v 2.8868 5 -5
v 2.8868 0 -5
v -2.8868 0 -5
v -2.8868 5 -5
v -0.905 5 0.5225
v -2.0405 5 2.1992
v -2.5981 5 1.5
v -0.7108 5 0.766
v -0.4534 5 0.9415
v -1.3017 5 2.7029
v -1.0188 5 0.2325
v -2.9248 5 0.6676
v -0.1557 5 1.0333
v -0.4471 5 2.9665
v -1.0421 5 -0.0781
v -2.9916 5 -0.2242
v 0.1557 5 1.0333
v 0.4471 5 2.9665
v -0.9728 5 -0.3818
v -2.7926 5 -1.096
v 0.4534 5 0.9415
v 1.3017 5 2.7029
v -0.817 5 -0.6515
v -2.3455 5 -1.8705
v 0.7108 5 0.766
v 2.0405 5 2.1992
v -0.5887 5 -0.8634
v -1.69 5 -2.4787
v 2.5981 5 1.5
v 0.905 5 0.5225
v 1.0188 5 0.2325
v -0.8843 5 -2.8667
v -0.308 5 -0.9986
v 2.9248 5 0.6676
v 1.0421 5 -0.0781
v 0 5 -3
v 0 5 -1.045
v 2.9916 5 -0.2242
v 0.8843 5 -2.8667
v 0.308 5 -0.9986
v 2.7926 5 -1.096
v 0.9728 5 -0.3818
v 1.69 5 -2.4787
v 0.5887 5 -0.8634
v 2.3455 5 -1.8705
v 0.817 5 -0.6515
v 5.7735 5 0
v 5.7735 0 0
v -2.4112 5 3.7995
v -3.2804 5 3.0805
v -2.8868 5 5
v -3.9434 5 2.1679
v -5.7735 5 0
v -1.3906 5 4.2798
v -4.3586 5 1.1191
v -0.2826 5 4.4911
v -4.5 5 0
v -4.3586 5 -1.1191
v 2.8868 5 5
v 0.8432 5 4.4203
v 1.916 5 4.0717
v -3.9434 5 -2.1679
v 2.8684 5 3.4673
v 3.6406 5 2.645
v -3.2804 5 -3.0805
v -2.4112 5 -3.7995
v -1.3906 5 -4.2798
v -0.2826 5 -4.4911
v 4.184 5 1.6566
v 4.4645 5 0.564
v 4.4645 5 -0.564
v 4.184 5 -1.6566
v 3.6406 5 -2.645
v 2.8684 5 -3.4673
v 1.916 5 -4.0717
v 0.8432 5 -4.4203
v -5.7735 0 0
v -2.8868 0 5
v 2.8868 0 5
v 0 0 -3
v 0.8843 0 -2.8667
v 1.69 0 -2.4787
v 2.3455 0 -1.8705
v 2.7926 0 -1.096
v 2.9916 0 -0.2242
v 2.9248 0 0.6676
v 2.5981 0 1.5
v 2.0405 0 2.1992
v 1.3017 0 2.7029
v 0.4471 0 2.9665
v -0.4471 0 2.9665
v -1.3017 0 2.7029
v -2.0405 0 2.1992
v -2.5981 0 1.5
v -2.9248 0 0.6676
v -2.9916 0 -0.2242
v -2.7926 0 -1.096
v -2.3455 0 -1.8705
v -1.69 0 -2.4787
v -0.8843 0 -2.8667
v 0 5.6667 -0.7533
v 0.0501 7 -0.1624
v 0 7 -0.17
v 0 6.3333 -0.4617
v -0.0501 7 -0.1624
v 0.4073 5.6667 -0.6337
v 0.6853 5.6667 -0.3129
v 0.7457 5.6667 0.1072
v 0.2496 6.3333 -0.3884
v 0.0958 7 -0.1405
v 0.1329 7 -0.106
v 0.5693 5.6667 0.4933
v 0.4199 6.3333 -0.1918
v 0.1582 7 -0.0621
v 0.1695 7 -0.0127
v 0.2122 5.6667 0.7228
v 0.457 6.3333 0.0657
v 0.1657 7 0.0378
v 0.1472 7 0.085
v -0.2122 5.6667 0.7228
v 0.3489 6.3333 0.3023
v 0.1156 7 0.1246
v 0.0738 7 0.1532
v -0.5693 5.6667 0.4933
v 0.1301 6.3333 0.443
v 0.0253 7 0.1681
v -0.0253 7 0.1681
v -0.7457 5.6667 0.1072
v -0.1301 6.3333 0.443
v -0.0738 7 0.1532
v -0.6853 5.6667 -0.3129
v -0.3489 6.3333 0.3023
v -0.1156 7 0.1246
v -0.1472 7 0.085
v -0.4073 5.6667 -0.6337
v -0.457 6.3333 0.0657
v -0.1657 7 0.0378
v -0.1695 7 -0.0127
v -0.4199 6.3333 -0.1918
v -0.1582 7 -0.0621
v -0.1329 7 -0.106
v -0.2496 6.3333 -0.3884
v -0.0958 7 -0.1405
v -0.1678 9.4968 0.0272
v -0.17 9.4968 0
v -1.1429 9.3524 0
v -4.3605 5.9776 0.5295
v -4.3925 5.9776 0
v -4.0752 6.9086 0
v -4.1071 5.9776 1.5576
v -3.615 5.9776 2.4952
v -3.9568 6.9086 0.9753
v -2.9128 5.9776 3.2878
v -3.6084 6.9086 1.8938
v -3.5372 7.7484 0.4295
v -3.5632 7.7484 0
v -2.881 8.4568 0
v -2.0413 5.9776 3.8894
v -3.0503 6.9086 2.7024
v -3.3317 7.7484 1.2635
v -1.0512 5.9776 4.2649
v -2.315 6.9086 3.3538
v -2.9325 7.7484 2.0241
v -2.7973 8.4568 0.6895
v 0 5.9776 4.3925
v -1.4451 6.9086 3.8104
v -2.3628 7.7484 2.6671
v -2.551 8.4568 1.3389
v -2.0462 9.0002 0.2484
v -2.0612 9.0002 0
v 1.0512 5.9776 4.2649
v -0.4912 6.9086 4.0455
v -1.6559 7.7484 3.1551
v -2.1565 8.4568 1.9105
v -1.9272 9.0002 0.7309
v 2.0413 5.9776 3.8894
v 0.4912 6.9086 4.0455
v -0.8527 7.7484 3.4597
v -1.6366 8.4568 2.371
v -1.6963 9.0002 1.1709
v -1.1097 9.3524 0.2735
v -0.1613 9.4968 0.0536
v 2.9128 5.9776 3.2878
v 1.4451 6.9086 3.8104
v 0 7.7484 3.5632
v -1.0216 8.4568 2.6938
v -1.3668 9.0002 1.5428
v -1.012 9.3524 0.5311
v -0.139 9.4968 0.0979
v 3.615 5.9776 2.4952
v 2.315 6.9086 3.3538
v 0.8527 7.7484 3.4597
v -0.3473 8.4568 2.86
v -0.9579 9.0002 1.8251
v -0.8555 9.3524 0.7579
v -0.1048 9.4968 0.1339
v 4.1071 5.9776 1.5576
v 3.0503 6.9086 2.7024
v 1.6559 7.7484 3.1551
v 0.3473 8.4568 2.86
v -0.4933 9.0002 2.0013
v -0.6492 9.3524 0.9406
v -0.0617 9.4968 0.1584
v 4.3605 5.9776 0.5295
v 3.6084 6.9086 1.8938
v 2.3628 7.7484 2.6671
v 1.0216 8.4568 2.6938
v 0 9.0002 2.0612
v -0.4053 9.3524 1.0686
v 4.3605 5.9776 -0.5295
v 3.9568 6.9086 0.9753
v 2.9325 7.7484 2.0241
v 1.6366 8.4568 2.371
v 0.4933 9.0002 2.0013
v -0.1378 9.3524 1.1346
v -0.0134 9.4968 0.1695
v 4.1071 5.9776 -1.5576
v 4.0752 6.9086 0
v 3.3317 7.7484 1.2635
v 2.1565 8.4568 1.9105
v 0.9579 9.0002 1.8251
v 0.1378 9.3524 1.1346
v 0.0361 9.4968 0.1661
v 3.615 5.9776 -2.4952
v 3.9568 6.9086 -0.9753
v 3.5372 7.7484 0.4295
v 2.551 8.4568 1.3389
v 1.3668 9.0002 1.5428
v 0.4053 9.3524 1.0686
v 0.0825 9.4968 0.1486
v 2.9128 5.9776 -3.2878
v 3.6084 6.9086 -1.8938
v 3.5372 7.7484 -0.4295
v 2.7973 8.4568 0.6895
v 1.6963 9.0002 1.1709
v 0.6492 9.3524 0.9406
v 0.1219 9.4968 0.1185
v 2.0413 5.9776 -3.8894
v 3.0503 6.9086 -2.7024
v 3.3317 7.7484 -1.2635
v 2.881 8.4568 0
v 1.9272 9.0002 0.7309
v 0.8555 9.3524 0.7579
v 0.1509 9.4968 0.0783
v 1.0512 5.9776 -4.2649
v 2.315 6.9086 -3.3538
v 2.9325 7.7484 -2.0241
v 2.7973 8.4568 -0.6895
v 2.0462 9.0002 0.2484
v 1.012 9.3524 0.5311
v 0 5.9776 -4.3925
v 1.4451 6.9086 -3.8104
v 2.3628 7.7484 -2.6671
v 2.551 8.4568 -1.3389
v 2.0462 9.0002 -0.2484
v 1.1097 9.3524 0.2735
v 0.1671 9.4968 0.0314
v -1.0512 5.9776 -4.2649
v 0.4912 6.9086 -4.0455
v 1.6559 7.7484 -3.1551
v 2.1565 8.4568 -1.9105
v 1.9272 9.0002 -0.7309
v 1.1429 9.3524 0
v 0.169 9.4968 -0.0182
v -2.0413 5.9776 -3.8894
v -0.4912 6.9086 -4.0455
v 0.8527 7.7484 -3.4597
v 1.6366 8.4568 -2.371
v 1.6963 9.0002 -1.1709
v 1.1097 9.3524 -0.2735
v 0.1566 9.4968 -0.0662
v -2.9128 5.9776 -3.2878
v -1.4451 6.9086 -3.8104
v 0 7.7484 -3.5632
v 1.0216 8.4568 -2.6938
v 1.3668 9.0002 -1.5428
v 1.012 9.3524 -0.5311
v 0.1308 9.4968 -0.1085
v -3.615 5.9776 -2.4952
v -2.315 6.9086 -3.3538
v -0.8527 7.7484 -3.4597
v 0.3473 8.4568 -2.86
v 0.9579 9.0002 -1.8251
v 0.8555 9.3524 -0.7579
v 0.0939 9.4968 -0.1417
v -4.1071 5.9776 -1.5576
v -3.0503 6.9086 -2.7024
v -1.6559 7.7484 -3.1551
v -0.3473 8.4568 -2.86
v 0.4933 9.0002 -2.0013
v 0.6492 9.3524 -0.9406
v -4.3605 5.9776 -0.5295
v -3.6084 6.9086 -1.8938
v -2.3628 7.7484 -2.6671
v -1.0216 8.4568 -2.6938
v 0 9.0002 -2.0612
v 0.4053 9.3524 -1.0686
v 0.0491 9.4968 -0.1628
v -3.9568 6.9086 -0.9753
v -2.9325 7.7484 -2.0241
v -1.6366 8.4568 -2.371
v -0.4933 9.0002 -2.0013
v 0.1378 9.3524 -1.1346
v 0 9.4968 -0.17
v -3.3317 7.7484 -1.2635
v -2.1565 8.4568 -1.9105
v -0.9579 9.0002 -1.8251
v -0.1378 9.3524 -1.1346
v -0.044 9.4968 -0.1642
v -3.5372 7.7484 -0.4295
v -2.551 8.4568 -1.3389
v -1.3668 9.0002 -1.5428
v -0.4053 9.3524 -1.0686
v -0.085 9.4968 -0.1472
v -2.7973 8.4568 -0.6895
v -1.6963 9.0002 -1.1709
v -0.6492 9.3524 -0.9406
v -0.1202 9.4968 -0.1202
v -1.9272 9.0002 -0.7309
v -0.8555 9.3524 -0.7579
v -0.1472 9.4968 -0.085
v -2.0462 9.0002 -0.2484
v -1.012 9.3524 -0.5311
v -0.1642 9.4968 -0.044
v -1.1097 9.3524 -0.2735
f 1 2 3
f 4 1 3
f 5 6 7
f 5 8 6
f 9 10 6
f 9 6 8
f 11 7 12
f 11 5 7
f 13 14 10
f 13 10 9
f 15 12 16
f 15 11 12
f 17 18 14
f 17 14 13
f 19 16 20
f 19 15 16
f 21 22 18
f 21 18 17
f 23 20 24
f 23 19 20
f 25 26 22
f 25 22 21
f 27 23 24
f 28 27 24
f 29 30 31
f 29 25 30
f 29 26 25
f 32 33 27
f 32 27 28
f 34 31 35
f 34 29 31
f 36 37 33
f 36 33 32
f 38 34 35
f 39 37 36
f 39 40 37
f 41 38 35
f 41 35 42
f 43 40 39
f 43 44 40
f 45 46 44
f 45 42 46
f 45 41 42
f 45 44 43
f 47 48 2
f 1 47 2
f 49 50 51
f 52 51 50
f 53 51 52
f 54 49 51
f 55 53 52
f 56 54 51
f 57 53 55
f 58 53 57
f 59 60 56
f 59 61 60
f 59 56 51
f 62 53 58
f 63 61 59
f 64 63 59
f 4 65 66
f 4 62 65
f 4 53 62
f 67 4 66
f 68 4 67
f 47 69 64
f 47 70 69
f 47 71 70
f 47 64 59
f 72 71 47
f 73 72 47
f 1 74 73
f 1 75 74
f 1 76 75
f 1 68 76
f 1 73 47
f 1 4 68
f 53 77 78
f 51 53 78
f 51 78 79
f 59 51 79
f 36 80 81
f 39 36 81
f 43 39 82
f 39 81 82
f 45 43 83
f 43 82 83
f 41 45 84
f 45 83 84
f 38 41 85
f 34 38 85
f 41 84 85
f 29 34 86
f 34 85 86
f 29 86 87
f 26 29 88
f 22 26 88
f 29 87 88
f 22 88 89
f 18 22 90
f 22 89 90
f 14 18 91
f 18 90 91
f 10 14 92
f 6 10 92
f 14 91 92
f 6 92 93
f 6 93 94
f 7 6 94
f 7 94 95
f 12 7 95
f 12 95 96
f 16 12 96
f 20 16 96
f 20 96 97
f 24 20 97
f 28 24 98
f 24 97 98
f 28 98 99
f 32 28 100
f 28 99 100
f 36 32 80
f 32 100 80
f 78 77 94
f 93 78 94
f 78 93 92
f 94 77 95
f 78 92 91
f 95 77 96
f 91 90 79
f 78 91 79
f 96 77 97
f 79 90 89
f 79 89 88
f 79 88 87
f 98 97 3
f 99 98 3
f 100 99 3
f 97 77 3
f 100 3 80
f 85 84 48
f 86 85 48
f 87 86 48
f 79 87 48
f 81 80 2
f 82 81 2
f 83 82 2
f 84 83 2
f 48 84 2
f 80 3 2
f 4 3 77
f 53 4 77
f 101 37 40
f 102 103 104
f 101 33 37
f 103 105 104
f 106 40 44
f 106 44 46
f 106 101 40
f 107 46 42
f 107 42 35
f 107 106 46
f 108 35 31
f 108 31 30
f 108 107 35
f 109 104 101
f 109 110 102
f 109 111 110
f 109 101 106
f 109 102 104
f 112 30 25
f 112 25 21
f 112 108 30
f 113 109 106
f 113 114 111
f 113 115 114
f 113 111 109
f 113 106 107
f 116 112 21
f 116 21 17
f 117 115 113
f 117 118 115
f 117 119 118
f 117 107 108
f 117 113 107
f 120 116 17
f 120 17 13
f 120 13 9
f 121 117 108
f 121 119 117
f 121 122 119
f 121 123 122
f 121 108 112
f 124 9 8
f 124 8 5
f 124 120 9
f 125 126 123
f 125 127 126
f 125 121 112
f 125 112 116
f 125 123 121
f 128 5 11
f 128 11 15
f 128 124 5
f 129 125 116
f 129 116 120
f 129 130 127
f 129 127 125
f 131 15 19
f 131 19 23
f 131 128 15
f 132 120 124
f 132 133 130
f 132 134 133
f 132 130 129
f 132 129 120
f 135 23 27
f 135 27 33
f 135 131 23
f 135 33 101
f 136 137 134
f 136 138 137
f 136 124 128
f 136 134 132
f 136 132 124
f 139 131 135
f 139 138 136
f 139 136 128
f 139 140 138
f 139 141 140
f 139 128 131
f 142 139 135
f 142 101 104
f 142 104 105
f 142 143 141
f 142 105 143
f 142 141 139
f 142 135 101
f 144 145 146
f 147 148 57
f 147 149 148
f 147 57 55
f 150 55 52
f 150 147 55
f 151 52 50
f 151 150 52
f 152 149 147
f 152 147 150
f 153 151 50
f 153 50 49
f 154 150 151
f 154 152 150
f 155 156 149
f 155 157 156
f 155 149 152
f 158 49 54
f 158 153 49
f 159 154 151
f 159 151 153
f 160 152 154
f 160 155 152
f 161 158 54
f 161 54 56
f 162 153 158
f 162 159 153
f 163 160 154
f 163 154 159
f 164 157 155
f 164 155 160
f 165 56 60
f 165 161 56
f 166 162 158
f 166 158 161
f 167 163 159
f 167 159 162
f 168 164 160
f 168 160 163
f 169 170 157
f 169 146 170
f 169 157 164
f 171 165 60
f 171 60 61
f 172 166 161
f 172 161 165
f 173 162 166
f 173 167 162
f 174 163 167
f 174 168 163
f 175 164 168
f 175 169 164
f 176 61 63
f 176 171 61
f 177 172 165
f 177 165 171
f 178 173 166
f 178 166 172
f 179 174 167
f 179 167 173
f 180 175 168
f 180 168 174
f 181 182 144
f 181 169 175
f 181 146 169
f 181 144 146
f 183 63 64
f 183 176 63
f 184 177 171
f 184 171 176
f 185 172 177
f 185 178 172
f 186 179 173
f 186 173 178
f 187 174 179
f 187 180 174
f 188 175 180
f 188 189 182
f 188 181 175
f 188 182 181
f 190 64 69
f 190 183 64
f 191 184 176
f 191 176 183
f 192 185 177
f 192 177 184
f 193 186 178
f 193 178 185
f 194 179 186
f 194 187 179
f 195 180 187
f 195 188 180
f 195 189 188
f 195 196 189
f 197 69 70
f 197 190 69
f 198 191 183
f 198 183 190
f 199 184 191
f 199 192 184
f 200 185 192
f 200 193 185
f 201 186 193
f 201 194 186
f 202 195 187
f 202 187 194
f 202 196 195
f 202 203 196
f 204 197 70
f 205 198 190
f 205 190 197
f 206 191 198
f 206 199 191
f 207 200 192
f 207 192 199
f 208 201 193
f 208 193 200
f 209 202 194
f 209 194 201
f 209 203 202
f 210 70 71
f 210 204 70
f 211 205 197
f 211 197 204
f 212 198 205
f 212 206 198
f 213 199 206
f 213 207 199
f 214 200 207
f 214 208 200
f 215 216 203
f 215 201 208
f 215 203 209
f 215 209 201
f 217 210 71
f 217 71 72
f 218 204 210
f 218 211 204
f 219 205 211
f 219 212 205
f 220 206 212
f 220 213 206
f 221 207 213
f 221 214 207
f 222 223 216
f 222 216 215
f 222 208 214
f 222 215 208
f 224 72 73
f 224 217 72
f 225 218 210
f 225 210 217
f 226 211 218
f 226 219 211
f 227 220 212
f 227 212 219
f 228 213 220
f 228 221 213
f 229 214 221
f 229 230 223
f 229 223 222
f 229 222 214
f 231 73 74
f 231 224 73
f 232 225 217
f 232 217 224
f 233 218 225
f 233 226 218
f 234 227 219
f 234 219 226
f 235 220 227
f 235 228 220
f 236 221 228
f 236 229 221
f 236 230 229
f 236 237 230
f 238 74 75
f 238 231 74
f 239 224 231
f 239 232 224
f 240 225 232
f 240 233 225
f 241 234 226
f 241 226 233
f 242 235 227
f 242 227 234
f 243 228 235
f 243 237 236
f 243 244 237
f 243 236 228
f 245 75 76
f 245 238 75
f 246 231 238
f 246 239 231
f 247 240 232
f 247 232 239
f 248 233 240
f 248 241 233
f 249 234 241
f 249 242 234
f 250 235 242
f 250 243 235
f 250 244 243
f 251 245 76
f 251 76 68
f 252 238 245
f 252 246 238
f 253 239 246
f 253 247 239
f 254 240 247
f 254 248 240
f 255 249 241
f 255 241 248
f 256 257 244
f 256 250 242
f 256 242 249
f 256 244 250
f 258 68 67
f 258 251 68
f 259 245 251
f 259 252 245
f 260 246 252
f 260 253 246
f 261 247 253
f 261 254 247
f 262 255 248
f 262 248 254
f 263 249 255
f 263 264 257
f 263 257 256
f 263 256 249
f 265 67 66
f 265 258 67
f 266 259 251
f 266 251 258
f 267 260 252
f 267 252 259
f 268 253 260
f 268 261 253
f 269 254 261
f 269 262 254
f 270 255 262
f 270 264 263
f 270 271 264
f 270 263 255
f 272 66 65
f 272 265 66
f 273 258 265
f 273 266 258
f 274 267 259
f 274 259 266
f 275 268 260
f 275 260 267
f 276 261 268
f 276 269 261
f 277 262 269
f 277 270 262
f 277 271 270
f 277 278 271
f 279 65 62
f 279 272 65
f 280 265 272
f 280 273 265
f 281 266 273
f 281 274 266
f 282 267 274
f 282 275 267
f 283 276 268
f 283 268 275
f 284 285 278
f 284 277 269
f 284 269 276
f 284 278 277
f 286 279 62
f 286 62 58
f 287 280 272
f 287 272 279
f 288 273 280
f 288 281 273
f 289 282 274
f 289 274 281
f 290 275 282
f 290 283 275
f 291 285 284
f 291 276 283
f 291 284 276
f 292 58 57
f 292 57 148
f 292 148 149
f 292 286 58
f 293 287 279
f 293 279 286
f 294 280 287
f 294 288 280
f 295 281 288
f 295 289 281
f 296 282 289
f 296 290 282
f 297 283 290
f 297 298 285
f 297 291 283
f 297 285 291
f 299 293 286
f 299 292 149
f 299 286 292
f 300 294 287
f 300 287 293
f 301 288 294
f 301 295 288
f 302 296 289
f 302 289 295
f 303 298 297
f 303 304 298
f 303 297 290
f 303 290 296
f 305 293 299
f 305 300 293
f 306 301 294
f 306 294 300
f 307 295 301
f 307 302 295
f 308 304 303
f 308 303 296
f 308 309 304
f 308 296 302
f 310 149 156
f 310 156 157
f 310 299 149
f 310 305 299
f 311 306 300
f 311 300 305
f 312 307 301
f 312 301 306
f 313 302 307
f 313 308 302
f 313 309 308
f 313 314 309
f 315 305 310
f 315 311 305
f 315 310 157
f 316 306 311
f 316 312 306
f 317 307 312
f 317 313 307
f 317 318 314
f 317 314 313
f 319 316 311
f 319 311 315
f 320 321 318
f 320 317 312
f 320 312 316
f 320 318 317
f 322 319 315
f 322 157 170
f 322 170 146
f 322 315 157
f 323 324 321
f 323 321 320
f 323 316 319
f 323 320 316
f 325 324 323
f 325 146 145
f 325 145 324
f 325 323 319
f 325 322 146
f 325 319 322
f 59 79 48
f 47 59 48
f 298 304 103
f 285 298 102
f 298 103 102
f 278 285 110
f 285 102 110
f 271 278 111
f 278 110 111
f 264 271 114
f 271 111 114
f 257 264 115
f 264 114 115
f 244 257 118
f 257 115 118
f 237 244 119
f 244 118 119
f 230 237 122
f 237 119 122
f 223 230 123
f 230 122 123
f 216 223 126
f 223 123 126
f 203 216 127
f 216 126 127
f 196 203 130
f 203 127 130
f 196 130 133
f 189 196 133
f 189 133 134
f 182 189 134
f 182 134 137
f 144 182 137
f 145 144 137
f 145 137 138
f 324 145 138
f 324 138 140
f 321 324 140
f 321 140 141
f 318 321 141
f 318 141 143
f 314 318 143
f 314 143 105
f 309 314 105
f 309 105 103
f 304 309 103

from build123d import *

# Parameters (mm, degrees)
BOSS_EXTRUDE1_DEPTH = 5
SKETCH4_R           = 3
CUT_EXTRUDE1_DEPTH  = 5
SKETCH6_R           = 0.17
CUT_EXTRUDE2_DEPTH  = 10.128709292
CHAMFER2_SIZE       = 0.875
CHAMFER2_SIZE2      = 2


with BuildPart() as part:
    # Sketch1 → Boss-Extrude1 (new body)
    with BuildSketch(Plane(origin=(0, 0, 0), x_dir=(1, 0, 0), z_dir=(0, 1, 0))):
        Polygon((5.773502692, 0), (2.886751346, 5), (-2.886751346, 5), (-5.773502692, 0), (-2.886751346, -5), (2.886751346, -5), align=None)
    extrude(amount=BOSS_EXTRUDE1_DEPTH)

    # Sketch3 → Revolve1 (revolve)
    with BuildSketch(Plane.XY):
        with BuildLine():
            Line((0, 5), (-4.5, 5))
            ThreePointArc((-4.5, 5), (-3.181980515, 8.181980515), (0, 9.5))
            Line((0, 9.5), (0, 5))
        make_face()
    revolve(axis=Axis((0, 0, 0), (0, 1, 0)))

    # Sketch4 → Cut-Extrude1 (cut)
    with BuildSketch(Plane.XZ):
        with Locations(Location((0, 0, 0), (0, 0, 270))):
            Circle(SKETCH4_R)
    extrude(amount=-CUT_EXTRUDE1_DEPTH, mode=Mode.SUBTRACT)

    # Sketch6 → Cut-Extrude2 (cut, through all)
    with BuildSketch(Plane.XZ.offset(-5)):
        with Locations(Location((0, 0, 0), (0, 0, 270))):
            Circle(SKETCH6_R)
    extrude(amount=-CUT_EXTRUDE2_DEPTH, mode=Mode.SUBTRACT)

    # Chamfer2
    chamfer2_edges = [part.edges().sort_by_distance(p)[0] for p in [
        (0, 5, 0.17),
    ]]
    chamfer2_side = [part.faces().sort_by_distance(p)[0] for p in [
        (0, 5, 2.915147186),
    ]]
    chamfer(chamfer2_edges, length=CHAMFER2_SIZE, length2=CHAMFER2_SIZE2, reference=chamfer2_side[0])


solid = part.part
